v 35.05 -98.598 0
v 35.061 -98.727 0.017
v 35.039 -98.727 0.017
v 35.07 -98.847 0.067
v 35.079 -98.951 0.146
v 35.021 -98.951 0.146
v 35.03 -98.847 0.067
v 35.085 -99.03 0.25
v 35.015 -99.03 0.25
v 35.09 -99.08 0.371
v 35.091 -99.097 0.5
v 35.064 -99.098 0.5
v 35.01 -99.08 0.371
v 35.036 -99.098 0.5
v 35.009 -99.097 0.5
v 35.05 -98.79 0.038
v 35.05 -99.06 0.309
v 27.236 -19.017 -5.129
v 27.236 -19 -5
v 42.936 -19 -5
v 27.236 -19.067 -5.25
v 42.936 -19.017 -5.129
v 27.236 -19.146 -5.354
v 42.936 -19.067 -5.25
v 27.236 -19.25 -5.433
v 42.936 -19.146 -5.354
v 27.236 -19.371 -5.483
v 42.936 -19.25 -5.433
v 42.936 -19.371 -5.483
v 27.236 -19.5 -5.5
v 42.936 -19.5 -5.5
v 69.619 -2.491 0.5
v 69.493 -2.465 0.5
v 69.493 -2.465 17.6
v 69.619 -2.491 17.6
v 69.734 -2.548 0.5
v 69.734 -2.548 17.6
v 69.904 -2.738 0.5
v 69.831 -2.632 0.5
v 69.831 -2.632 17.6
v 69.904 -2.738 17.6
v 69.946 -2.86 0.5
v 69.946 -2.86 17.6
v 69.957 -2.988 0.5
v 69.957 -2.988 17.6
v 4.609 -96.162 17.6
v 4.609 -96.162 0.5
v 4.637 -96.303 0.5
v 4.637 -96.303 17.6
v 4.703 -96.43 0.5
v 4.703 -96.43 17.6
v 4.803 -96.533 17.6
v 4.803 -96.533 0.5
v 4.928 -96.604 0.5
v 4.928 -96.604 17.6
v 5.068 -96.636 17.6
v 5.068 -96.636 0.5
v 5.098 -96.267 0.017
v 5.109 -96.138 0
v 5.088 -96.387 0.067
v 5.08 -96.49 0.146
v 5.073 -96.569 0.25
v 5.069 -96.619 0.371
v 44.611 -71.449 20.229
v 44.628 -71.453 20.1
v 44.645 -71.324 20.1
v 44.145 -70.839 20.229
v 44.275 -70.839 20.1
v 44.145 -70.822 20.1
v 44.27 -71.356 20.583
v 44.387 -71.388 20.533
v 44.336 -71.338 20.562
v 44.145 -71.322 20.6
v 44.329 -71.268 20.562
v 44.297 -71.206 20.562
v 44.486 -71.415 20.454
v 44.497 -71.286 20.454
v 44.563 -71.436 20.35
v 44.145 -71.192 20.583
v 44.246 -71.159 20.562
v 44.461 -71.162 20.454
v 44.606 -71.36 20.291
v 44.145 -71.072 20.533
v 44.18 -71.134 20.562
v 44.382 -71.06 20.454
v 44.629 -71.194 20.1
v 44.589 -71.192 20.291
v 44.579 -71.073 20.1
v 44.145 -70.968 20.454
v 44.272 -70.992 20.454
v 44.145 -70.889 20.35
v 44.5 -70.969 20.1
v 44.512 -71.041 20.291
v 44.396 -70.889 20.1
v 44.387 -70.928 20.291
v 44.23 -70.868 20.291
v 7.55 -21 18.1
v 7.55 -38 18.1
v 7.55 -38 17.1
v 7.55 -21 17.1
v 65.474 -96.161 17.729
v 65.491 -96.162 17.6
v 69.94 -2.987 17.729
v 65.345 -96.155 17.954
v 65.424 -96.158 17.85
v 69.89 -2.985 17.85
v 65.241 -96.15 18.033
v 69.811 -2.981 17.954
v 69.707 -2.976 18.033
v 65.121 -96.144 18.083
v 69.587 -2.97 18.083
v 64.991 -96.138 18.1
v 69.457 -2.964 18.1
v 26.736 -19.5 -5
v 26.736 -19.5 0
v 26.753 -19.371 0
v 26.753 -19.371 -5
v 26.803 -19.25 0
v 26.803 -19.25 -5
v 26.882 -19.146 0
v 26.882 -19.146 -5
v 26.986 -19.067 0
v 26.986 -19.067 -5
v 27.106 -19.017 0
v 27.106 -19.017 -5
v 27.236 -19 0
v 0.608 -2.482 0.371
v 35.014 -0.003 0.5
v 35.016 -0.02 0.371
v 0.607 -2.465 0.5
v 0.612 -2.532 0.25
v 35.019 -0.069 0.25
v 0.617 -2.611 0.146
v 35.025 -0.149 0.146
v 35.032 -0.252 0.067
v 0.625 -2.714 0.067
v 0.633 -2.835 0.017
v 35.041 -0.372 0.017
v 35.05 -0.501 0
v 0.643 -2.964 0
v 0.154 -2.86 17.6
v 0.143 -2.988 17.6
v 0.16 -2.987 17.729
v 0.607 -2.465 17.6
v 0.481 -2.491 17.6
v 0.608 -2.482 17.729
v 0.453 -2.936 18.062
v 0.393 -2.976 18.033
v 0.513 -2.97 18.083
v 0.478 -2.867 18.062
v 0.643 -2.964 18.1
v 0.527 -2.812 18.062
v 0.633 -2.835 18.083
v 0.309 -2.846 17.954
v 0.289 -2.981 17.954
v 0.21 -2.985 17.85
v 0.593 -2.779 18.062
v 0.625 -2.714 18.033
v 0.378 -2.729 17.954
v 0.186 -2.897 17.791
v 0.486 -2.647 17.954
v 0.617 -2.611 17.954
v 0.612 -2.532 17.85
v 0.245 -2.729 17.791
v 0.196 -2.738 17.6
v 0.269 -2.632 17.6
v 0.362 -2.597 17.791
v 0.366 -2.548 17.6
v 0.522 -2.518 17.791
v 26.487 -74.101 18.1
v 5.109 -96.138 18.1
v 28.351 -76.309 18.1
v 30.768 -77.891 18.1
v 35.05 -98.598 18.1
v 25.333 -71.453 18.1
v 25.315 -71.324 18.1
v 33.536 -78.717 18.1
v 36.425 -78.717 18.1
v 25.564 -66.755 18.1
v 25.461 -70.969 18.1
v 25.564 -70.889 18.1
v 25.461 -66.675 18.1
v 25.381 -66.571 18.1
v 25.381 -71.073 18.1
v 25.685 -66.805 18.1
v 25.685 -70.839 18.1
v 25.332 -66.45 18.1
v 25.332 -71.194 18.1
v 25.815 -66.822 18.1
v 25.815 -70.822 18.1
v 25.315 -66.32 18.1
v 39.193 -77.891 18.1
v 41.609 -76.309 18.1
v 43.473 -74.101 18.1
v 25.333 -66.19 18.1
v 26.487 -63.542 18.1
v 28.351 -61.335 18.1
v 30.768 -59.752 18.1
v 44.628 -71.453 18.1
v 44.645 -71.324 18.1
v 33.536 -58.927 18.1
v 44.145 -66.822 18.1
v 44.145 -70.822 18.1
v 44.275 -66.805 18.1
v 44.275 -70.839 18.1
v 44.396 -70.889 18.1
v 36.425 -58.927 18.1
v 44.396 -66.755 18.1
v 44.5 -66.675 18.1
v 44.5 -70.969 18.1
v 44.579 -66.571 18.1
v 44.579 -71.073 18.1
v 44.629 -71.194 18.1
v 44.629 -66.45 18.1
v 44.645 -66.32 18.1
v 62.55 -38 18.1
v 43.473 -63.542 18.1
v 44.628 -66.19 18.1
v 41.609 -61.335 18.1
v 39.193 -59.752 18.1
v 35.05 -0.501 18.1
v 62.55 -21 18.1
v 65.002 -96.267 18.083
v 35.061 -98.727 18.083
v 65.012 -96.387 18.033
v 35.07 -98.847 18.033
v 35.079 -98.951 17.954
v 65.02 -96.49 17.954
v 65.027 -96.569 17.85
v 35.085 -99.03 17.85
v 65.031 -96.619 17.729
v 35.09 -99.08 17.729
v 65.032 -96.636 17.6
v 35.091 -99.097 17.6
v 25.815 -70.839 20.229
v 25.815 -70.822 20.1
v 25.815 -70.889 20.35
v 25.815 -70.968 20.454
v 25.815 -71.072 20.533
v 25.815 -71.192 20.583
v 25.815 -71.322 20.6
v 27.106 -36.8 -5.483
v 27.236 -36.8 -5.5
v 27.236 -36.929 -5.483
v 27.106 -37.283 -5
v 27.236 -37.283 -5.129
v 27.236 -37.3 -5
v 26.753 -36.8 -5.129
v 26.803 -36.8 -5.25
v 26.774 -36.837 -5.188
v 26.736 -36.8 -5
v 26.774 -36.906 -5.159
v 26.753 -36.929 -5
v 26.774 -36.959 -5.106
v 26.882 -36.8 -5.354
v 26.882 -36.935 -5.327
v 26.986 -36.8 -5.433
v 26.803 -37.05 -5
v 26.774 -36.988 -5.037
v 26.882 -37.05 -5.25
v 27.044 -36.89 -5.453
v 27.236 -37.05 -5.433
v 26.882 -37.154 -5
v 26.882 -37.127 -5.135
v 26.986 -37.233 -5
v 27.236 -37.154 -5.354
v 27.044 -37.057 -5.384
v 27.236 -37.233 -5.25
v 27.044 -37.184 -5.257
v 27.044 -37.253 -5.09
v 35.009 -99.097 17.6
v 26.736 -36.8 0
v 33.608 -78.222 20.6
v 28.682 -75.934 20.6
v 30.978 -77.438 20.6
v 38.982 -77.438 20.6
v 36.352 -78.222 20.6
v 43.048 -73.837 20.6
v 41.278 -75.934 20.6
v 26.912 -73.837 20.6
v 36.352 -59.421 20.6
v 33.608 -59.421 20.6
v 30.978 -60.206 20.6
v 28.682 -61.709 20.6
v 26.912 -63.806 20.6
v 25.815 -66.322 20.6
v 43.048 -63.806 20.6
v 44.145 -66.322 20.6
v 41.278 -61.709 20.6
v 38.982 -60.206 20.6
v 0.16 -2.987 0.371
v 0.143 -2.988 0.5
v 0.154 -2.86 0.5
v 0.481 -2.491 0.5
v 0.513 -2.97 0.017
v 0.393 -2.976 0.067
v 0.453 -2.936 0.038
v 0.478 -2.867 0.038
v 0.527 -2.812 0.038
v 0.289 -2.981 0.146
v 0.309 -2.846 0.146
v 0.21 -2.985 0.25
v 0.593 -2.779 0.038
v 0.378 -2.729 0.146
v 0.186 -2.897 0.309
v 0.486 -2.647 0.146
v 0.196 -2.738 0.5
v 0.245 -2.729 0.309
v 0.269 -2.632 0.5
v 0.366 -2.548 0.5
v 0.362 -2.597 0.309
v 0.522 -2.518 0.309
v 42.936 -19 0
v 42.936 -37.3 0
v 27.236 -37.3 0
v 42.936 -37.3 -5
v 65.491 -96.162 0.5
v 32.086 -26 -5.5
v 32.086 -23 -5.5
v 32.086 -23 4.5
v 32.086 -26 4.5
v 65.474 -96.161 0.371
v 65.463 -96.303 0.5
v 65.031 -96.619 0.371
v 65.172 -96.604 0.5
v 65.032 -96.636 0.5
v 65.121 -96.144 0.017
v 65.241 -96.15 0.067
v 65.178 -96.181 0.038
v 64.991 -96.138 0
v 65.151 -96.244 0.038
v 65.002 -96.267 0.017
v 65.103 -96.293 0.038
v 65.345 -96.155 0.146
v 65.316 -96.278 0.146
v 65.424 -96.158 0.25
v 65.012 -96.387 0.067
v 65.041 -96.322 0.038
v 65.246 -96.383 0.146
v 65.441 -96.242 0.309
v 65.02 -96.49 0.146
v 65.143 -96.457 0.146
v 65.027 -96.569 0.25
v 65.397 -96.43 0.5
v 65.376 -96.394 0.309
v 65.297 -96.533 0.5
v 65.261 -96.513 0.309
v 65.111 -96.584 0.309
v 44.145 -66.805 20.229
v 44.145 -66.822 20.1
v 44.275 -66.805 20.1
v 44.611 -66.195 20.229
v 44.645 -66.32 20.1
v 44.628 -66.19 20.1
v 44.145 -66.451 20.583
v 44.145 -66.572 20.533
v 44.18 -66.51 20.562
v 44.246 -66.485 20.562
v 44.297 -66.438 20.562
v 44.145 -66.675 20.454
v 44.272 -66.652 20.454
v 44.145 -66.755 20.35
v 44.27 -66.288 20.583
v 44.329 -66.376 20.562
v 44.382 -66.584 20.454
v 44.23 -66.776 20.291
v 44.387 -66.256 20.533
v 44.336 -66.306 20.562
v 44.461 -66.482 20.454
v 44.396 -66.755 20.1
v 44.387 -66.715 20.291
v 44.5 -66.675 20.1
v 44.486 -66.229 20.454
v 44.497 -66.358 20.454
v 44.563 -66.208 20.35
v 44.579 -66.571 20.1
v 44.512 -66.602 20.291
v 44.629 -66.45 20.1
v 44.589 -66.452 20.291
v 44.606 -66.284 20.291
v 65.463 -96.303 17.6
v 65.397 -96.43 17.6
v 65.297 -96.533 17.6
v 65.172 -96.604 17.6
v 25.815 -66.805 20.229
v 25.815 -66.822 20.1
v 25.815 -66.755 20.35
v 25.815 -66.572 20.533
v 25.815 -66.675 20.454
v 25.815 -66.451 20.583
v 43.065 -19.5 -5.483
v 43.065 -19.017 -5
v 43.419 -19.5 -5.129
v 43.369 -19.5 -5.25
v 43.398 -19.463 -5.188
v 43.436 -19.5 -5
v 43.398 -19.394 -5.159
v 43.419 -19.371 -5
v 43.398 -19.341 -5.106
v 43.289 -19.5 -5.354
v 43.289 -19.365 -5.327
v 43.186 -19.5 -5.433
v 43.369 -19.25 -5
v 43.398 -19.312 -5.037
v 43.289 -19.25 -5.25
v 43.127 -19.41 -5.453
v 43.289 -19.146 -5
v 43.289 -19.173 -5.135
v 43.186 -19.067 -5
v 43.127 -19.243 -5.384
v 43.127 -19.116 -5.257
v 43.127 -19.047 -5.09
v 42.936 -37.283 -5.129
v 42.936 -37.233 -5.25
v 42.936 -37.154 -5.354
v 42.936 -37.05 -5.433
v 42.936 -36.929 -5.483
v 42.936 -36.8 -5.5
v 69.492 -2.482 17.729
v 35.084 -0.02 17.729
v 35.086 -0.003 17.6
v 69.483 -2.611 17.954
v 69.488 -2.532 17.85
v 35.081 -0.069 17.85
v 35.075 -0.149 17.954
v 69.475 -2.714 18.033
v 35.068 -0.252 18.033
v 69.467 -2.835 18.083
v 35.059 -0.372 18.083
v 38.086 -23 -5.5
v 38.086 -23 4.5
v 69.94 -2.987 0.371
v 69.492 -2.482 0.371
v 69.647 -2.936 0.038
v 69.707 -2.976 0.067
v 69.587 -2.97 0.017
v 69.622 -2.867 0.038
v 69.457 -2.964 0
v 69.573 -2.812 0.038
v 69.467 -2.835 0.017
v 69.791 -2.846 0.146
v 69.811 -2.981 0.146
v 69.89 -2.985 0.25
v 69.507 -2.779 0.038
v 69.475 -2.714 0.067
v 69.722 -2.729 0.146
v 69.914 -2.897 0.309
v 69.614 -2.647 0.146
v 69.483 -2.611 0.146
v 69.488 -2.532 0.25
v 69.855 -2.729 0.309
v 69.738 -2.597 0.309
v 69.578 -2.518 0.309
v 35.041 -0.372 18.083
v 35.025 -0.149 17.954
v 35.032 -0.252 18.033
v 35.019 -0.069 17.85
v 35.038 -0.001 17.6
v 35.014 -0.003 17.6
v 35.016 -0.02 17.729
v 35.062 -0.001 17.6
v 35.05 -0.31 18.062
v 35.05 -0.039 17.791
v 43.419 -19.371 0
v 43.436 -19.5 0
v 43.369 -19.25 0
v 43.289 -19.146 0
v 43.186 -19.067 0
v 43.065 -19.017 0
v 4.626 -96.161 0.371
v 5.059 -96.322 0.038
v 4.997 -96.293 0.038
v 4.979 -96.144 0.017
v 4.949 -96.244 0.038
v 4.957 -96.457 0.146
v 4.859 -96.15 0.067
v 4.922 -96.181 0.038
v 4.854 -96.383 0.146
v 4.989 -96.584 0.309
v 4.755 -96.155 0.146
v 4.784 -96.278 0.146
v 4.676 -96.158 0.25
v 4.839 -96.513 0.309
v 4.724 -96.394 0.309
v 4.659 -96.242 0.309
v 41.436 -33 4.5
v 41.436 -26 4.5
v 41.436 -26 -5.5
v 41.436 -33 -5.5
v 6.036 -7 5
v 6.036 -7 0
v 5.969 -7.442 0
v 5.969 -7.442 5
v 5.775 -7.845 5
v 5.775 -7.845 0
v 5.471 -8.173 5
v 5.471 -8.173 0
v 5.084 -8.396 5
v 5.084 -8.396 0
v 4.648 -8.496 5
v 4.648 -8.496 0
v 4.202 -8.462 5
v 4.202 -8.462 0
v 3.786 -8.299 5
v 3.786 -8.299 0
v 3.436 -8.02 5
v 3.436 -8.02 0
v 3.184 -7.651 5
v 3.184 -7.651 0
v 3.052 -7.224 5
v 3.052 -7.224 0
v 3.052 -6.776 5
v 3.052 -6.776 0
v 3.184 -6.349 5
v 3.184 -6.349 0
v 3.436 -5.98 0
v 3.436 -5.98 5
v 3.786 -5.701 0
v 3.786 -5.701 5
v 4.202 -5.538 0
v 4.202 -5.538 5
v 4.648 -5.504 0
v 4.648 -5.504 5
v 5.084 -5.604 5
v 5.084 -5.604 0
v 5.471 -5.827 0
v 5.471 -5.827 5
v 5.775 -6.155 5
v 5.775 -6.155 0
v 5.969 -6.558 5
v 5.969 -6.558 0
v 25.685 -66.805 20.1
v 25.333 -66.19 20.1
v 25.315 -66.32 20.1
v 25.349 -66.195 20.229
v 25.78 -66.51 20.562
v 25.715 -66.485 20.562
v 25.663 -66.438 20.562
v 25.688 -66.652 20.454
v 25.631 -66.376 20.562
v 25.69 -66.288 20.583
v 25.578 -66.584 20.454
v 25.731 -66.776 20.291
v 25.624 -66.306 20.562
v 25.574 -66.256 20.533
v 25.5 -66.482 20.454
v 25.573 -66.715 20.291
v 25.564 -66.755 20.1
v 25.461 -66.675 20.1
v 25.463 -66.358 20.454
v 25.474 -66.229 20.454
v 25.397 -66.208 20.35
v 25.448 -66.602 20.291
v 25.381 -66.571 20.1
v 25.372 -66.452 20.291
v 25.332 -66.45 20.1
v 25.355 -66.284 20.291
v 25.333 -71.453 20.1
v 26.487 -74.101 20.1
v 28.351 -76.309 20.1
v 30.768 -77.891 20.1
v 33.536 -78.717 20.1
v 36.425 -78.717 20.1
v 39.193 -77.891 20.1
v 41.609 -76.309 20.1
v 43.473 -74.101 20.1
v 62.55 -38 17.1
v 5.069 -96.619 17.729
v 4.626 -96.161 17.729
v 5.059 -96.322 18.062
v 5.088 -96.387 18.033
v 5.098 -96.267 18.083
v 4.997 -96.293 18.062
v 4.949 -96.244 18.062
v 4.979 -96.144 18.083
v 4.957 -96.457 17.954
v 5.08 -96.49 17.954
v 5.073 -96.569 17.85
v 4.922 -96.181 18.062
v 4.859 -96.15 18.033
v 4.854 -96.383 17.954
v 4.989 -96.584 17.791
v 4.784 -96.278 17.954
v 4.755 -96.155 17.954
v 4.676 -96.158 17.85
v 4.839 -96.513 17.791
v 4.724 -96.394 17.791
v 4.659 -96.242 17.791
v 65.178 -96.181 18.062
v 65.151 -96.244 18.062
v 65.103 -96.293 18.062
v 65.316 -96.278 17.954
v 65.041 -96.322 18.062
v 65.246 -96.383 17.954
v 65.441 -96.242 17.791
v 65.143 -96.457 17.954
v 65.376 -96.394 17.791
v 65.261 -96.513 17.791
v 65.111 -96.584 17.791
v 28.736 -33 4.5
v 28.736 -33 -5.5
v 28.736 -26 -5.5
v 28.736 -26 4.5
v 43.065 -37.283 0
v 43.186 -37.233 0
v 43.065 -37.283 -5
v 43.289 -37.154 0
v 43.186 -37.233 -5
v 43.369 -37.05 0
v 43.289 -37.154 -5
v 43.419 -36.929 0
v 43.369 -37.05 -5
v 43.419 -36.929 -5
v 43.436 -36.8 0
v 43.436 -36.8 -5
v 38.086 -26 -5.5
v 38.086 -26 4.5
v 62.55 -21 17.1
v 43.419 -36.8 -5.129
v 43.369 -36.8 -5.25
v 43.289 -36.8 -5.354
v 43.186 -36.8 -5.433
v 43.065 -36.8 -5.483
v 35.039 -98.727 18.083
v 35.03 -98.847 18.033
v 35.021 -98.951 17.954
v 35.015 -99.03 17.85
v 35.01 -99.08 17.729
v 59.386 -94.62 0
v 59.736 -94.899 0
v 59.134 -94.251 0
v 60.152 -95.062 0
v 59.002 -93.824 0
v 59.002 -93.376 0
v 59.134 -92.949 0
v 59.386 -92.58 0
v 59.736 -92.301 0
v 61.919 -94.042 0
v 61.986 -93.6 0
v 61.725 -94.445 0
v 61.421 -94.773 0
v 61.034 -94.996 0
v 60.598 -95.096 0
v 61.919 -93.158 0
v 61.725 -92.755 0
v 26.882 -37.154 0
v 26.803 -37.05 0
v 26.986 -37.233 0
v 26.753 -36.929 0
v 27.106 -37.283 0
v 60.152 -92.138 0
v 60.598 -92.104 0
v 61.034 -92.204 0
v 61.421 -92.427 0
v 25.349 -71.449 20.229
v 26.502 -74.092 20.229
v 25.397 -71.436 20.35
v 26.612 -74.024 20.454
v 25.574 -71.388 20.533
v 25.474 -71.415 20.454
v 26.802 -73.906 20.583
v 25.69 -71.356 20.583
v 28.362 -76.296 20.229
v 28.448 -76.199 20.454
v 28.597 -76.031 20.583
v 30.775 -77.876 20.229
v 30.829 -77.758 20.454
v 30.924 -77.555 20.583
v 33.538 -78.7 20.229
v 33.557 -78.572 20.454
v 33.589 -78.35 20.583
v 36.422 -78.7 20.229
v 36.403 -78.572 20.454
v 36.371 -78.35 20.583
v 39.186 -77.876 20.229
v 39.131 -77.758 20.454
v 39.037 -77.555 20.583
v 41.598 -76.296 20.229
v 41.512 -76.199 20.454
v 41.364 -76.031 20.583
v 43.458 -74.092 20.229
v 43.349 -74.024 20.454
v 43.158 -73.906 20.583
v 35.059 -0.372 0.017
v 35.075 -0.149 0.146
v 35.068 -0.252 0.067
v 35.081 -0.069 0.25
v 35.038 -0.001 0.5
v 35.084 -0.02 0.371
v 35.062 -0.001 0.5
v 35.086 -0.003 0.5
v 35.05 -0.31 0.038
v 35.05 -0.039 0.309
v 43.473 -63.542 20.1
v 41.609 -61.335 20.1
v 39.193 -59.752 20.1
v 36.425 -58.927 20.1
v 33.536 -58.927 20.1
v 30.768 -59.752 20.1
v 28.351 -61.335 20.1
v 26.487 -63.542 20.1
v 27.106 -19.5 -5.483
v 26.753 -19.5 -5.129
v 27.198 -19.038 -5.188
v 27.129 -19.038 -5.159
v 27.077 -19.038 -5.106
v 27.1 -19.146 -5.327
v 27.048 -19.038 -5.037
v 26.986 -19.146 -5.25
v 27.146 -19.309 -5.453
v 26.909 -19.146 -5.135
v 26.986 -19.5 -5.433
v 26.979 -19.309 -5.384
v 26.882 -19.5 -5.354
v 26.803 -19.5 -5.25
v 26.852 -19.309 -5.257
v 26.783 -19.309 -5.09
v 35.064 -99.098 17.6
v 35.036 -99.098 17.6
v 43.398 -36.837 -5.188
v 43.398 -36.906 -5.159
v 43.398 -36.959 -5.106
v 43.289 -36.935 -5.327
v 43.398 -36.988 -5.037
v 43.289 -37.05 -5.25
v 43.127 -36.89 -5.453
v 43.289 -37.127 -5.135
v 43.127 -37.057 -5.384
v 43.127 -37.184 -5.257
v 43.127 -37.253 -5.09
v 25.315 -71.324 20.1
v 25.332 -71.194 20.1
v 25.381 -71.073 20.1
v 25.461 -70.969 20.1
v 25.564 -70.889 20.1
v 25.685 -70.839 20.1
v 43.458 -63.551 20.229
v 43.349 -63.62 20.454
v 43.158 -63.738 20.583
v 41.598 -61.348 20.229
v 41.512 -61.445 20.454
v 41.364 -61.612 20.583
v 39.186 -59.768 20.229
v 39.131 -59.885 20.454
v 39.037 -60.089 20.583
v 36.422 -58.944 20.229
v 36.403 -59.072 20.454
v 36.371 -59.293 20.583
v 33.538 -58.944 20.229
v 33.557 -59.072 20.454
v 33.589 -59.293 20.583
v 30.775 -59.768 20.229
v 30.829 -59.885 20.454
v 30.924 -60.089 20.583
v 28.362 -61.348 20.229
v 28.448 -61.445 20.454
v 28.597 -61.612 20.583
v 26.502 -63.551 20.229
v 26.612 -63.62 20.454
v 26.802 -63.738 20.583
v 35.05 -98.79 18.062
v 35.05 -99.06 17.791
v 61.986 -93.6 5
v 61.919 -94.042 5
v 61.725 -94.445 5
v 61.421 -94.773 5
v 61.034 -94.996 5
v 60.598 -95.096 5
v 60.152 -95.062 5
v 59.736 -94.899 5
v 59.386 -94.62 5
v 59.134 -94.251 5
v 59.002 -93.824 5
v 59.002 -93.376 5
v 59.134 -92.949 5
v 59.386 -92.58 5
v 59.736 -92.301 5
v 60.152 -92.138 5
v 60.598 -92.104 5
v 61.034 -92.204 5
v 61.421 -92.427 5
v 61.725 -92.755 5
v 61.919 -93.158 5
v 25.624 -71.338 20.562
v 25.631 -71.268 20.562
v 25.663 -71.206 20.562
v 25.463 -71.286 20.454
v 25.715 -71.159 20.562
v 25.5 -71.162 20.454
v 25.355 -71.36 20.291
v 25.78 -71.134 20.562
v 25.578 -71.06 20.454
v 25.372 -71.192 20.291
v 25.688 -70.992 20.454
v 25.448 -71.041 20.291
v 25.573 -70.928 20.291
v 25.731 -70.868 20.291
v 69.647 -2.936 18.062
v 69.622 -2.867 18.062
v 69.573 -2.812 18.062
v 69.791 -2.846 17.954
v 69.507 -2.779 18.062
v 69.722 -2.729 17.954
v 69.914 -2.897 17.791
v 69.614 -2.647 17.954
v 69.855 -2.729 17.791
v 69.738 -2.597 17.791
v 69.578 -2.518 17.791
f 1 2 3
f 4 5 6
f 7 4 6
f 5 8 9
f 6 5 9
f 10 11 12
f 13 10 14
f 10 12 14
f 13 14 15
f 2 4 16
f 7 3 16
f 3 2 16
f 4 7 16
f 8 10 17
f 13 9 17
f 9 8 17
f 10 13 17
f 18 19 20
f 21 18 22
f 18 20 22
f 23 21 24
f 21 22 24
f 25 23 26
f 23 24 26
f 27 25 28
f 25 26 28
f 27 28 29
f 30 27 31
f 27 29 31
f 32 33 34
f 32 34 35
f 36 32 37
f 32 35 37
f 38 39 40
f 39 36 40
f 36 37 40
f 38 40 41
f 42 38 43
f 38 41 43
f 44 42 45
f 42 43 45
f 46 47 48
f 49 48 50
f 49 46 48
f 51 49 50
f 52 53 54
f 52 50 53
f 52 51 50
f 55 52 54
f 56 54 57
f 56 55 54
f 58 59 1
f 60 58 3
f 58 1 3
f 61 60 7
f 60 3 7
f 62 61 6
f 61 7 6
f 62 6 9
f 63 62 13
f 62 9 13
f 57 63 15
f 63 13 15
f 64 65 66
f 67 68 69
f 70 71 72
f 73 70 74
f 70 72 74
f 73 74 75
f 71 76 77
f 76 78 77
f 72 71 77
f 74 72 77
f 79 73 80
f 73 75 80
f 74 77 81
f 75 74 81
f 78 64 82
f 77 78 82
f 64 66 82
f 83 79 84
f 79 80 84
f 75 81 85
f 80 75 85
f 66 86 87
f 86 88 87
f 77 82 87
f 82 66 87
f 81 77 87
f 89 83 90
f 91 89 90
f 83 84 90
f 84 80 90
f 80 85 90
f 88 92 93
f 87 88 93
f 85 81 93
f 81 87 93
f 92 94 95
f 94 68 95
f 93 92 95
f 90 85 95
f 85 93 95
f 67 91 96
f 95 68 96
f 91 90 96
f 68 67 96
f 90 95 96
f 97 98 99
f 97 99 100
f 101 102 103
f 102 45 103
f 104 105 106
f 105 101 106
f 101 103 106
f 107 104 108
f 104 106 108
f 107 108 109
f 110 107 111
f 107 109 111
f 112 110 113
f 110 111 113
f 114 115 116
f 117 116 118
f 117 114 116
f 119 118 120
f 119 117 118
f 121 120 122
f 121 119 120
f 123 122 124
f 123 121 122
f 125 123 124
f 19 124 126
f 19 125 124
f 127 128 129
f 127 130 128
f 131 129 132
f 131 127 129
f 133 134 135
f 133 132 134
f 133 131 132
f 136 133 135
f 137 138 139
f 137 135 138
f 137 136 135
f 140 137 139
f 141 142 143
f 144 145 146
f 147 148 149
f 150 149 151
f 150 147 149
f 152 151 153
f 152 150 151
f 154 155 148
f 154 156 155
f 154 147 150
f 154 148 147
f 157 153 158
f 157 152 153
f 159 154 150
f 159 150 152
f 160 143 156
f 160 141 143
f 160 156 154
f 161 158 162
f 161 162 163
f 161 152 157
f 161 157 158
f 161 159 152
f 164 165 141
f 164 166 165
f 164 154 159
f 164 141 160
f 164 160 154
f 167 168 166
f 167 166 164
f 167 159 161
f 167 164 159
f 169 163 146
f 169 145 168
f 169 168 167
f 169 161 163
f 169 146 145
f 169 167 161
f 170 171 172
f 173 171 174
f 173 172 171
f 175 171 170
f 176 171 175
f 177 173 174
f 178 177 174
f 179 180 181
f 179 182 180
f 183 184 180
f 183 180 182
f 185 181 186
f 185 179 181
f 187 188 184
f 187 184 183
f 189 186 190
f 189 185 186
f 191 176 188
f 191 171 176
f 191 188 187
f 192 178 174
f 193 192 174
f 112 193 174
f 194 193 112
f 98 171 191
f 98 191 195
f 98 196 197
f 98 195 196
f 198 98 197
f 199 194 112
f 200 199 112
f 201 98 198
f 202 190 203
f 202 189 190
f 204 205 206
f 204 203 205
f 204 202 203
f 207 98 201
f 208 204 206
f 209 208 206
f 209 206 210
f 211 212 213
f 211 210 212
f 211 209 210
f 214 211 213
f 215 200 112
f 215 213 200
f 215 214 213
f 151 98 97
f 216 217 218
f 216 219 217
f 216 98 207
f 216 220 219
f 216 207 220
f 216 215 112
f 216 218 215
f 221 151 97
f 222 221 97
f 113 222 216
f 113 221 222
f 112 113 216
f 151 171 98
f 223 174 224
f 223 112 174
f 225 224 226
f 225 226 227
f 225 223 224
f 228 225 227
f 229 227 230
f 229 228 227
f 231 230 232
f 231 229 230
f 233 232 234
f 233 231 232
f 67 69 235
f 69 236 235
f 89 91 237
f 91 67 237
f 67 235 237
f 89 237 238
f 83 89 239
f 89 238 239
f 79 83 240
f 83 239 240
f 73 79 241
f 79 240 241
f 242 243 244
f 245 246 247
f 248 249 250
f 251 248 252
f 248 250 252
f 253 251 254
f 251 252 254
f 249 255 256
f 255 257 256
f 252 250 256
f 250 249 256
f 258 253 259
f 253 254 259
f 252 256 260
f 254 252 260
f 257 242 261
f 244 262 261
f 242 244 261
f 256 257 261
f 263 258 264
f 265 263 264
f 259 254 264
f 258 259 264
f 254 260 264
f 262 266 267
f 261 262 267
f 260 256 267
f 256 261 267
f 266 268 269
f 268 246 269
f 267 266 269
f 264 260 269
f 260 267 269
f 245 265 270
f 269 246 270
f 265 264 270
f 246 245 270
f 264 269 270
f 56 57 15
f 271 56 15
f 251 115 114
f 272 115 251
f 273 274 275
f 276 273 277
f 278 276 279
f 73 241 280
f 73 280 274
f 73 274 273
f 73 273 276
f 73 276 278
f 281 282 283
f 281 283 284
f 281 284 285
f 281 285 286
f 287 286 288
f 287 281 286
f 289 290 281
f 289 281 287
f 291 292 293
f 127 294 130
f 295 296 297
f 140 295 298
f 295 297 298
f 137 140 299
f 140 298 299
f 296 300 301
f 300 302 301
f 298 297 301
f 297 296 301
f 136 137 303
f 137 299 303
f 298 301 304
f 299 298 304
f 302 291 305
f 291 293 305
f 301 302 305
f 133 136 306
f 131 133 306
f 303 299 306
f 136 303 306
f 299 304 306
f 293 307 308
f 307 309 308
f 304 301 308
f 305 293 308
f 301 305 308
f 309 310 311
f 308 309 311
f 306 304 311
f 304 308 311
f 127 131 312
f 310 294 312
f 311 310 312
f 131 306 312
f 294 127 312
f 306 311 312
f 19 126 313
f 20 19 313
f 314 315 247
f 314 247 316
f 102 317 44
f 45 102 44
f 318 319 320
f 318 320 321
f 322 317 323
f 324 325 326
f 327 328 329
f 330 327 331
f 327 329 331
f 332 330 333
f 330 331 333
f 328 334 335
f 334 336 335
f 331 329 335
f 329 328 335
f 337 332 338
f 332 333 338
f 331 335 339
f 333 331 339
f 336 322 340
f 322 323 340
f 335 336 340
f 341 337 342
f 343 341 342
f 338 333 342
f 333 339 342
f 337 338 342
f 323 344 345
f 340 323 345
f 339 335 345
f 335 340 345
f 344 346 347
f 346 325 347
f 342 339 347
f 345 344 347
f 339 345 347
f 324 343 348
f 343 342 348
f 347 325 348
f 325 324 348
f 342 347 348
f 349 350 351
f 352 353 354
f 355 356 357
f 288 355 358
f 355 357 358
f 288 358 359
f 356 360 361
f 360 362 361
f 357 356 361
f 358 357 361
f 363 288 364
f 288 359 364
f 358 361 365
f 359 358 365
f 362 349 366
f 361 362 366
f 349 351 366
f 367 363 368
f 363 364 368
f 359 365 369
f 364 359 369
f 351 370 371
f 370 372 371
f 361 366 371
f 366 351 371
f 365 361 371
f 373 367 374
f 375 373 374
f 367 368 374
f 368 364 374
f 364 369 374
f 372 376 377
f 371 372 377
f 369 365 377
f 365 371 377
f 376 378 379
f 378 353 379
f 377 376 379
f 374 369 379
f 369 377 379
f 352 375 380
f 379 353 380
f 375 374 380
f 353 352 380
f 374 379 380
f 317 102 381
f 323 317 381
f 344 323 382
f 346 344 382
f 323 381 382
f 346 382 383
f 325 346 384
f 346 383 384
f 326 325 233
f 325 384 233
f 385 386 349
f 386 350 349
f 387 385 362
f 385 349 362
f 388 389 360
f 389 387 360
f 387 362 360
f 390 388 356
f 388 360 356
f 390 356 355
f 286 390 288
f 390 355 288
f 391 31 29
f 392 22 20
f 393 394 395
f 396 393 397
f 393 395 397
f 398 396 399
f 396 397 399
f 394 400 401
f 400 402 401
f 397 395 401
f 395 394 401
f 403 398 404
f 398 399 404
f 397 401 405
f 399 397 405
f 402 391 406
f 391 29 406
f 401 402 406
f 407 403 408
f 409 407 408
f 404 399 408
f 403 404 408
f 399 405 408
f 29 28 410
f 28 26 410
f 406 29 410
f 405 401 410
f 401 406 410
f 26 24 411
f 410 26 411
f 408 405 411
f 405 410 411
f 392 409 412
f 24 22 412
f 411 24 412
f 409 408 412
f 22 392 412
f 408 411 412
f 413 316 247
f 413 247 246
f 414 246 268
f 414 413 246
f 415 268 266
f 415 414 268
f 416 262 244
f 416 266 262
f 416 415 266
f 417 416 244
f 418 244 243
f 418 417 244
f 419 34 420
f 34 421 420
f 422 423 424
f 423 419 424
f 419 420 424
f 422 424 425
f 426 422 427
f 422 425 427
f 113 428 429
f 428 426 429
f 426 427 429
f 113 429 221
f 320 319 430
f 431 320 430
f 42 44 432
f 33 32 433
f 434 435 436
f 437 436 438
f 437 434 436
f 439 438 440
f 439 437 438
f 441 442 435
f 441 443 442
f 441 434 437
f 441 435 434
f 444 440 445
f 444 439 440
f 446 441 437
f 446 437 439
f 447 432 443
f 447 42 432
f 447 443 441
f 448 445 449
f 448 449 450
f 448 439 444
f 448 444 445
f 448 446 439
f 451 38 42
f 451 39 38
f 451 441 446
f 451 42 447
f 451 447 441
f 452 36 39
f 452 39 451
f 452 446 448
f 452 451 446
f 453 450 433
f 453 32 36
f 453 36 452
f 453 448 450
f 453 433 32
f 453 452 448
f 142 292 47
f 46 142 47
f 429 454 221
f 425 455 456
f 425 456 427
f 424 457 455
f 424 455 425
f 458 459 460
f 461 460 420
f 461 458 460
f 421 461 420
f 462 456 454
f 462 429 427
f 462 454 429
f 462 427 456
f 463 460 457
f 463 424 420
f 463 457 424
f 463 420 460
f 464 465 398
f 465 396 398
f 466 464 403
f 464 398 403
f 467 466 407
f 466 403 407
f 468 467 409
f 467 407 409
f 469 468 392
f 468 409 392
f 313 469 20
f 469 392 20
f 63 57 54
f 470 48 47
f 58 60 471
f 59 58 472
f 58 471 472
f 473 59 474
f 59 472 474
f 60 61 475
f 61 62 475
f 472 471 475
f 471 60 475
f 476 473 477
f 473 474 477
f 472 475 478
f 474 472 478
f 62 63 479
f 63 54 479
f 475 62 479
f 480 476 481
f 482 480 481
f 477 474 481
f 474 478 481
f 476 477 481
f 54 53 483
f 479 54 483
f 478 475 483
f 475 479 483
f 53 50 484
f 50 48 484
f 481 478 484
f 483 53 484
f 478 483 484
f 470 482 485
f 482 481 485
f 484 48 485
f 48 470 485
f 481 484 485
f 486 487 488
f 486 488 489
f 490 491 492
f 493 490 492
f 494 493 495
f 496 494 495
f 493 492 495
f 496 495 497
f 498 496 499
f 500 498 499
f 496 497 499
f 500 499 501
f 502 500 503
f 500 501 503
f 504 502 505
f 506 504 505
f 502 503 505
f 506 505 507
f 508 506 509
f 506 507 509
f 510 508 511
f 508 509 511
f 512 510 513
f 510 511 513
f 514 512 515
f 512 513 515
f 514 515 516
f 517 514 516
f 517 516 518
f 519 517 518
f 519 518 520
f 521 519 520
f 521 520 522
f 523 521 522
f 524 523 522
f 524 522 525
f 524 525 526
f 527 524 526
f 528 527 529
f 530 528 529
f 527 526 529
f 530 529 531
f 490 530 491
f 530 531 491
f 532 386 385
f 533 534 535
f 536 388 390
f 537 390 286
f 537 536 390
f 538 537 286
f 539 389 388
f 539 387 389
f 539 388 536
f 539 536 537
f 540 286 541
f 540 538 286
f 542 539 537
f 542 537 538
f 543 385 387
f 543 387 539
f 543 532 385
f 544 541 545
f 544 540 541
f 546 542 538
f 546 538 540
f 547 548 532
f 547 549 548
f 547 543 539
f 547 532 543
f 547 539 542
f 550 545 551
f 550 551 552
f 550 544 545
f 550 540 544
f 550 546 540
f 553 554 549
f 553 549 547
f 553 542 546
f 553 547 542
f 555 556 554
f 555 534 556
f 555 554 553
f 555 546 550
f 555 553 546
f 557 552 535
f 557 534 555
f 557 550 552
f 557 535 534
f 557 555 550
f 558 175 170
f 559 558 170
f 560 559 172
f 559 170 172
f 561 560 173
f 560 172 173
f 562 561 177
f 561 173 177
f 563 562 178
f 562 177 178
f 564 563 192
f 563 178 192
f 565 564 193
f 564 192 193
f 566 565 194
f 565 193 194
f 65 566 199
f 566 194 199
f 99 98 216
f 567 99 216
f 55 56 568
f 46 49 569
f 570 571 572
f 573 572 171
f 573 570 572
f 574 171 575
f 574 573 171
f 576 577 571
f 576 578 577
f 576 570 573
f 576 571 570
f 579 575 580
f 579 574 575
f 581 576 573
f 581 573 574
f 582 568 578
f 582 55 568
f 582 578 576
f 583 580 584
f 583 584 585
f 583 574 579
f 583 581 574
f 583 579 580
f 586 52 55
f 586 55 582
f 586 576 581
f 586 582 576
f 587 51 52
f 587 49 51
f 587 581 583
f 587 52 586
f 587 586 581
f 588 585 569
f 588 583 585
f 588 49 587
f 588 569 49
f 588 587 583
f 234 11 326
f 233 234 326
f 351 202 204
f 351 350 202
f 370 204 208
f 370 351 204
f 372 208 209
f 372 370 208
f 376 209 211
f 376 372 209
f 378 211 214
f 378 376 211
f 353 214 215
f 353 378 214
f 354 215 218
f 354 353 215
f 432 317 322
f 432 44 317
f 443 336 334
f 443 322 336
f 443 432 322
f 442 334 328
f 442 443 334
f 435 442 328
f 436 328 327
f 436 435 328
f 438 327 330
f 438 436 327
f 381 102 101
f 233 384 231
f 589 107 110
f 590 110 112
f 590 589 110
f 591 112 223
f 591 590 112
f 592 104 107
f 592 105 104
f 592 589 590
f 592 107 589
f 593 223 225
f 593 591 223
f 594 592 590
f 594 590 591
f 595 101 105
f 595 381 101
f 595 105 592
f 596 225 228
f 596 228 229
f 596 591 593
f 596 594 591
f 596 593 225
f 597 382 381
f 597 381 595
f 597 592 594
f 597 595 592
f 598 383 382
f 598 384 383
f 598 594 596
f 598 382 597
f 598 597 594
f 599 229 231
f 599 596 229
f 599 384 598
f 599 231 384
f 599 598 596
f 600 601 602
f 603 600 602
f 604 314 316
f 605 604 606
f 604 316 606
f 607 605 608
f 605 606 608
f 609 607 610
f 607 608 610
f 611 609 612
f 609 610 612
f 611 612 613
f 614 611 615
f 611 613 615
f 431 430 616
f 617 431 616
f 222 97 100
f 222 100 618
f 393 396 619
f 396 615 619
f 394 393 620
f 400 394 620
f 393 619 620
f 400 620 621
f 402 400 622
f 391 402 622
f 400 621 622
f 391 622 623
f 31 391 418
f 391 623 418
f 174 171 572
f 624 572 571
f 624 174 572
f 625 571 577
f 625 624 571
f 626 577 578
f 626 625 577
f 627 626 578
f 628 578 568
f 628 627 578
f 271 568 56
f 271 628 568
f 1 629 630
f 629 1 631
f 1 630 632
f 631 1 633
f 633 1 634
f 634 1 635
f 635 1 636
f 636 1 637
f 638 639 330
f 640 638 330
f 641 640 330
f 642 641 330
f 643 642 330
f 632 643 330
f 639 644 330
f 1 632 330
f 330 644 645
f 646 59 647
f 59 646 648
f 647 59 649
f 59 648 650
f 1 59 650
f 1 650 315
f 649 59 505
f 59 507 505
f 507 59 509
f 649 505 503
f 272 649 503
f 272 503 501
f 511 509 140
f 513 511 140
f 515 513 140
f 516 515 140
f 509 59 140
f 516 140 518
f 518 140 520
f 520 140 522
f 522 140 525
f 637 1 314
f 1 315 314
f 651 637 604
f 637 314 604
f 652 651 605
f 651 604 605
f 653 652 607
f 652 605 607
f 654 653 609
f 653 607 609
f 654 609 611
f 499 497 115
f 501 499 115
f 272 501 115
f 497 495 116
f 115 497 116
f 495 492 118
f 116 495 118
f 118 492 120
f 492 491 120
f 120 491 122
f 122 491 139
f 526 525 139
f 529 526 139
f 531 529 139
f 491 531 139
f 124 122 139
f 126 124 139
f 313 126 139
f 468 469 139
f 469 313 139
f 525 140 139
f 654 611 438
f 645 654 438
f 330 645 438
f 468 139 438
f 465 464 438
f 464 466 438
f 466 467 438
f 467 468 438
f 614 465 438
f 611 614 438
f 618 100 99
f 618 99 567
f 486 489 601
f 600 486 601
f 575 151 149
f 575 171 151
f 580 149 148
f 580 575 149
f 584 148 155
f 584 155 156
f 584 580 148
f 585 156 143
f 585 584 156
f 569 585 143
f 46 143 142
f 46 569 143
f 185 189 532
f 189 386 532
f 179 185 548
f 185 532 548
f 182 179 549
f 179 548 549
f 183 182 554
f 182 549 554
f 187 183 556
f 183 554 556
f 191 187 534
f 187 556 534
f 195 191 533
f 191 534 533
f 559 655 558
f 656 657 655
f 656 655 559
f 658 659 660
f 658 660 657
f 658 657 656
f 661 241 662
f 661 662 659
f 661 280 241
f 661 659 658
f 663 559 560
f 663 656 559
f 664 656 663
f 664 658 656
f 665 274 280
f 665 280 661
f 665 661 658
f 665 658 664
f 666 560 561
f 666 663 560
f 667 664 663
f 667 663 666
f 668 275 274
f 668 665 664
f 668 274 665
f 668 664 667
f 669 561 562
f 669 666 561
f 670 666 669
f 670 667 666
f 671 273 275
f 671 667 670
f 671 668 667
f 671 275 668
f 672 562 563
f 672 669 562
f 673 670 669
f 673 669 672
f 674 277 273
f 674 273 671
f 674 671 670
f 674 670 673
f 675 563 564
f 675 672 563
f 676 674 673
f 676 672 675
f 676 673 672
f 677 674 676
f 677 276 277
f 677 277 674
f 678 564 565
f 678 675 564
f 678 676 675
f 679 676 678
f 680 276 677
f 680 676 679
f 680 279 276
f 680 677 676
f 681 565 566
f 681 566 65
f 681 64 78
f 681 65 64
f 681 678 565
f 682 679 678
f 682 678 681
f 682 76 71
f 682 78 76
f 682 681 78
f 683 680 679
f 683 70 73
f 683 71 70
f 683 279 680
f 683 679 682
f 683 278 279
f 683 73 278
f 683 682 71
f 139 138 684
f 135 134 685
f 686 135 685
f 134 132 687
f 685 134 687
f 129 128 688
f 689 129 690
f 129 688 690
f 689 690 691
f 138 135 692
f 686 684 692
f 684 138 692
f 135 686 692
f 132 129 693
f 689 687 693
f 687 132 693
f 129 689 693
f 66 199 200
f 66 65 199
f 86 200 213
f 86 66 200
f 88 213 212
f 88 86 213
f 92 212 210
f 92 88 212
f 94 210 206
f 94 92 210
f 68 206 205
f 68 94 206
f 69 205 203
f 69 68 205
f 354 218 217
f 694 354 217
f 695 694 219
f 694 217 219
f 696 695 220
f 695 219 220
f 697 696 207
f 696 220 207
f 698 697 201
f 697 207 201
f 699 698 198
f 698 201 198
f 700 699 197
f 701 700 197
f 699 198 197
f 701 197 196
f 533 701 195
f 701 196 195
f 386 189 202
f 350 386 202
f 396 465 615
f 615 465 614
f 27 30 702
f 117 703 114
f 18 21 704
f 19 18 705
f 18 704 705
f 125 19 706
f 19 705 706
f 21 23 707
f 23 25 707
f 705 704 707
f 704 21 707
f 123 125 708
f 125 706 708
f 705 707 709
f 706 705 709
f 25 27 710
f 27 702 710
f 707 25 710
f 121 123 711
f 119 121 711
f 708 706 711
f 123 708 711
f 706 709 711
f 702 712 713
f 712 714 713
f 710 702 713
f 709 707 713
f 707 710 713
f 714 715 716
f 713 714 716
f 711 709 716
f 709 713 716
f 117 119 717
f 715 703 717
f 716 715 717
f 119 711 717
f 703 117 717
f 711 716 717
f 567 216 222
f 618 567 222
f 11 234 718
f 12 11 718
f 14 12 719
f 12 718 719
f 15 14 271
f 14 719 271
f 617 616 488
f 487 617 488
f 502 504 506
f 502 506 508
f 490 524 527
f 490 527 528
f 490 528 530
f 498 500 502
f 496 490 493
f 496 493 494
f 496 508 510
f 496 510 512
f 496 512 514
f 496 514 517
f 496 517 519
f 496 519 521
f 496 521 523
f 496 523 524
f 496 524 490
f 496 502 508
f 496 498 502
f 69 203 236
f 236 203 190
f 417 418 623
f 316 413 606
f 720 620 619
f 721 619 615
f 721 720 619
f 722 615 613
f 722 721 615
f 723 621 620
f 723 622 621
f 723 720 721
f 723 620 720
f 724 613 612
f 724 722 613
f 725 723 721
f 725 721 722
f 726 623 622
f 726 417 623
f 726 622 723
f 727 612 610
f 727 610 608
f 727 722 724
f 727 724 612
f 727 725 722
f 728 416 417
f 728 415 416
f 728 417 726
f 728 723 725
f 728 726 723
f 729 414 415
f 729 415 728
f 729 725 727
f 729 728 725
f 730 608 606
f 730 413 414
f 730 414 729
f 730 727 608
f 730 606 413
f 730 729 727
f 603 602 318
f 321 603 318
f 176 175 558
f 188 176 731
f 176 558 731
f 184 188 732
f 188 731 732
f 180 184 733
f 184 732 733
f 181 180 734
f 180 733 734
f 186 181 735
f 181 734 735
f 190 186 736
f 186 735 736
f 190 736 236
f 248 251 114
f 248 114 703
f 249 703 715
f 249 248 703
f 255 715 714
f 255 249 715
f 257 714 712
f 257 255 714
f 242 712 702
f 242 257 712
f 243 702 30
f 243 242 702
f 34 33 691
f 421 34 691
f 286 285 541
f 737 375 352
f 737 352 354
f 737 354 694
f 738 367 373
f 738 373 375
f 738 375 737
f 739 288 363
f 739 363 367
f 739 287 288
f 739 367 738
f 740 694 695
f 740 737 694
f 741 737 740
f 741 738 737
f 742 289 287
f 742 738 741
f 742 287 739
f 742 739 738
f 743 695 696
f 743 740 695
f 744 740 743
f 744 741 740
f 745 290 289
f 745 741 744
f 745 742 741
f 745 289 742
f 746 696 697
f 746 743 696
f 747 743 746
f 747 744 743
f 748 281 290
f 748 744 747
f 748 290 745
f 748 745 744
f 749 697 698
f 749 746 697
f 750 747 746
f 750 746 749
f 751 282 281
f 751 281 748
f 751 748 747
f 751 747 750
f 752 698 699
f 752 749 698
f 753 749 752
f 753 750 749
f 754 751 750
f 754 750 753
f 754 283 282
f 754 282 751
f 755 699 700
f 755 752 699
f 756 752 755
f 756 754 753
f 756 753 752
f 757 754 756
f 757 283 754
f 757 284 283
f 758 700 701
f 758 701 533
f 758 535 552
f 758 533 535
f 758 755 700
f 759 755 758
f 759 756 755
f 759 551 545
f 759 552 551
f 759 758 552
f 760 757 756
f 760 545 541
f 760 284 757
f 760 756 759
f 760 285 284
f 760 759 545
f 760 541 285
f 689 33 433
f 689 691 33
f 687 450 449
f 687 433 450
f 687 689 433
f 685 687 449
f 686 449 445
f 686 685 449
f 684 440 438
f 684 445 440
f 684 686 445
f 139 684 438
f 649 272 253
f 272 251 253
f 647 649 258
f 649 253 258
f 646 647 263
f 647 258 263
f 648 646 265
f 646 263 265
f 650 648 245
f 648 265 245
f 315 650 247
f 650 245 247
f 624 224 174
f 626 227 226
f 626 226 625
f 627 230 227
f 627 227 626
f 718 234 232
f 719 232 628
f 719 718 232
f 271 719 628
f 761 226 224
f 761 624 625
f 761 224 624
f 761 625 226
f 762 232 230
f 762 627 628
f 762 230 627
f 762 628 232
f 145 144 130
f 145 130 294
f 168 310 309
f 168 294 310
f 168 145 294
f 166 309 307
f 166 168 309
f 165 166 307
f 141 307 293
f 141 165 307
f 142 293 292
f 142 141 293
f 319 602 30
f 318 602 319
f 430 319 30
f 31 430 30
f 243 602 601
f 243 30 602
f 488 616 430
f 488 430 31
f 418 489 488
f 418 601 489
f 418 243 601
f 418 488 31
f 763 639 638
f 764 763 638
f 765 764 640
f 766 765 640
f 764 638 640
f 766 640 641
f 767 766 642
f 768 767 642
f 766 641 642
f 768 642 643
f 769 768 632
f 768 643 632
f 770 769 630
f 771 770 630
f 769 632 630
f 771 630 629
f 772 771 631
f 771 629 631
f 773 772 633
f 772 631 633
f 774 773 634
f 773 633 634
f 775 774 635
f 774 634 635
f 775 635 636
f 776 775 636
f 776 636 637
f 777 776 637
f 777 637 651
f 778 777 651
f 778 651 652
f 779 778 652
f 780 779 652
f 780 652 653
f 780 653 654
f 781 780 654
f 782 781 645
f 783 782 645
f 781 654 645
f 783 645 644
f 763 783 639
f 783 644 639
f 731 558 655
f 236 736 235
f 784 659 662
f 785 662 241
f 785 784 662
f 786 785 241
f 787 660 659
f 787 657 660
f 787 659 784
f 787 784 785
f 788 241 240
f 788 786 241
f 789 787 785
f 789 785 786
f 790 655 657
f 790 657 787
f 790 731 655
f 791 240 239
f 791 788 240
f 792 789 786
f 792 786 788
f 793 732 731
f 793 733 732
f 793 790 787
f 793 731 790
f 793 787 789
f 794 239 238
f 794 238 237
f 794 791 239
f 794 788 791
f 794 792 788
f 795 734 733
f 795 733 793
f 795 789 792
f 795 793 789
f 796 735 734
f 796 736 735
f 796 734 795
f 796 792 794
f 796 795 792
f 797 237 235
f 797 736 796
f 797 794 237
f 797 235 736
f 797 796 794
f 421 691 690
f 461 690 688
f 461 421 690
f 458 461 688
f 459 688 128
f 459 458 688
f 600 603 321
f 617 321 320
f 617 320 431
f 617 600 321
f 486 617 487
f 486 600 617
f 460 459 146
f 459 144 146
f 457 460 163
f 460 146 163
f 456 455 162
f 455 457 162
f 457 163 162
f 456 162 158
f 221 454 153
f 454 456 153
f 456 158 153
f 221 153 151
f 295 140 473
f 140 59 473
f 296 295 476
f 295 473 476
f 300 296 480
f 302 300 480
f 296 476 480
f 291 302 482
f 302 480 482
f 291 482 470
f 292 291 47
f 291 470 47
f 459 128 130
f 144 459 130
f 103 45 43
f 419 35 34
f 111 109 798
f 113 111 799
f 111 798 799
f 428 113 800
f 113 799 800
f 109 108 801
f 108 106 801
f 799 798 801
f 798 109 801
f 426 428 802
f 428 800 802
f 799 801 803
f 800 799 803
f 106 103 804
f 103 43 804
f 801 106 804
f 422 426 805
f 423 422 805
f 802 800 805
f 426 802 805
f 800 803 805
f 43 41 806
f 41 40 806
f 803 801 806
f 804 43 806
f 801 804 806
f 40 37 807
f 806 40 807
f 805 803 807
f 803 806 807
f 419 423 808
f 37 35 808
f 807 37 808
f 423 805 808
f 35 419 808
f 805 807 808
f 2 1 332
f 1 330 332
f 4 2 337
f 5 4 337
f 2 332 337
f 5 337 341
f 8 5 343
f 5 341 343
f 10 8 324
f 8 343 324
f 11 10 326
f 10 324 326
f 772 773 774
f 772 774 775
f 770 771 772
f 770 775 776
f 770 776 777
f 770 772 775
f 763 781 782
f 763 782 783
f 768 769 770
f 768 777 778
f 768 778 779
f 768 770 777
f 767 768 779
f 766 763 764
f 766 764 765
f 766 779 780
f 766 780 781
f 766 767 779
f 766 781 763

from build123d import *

# Parameters (mm, degrees)
F1_DEPTH  = 18.1
F3_DEPTH  = 2.5
F4_W      = 55
F4_H      = 17
F5_DEPTH  = 1
F6_R      = 0.5
F7_W      = 16.7
F7_H      = 18.3
F8_DEPTH  = 5.5
F9_R      = 0.5
F10_W     = 6
F10_H     = 3
F11_DEPTH = 10
F12_R     = 1.5
F13_DEPTH = 5


with BuildPart() as f1:
    # F0 (on Top) → F1 (new body)
    with BuildSketch(Plane.XY):
        Polygon((69.9801715439, -2.5), (35.05, 0), (0.1198284561, -2.5), (4.6301715439, -96.6), (35.05, -99.1), (65.4698284561, -96.6), align=None)
    extrude(amount=F1_DEPTH)

    # F2 (on face) → F3 (join)
    with BuildSketch(Plane.XY.offset(18.1)):
        with BuildLine():
            Line((25.1822125728, -66.8218548894), (44.778130515, -66.8218548894))
            ThreePointArc((44.778130515, -66.8218548894), (34.9801715439, -58.8218548894), (25.1822125728, -66.8218548894))
        make_face()
        with BuildLine():
            ThreePointArc((25.1822125728, -70.8218548894), (34.9801715439, -78.8218548894), (44.778130515, -70.8218548894))
            Line((44.778130515, -70.8218548894), (25.1822125728, -70.8218548894))
        make_face()
    extrude(amount=F3_DEPTH)

    # F4 (on face) → F5 (cut)
    with BuildSketch(Plane.XY.offset(18.1)):
        with Locations((35.05, -29.5)):
            Rectangle(F4_W, F4_H)
    extrude(amount=-F5_DEPTH, mode=Mode.SUBTRACT)

    # F6
    f6_edges = [f1.edges().sort_by_distance(p)[0] for p in [
        (34.980172, -66.821855, 20.6),
        (34.980172, -58.821855, 20.6),
        (34.980172, -78.821855, 20.6),
        (34.980172, -70.821855, 20.6),
        (25.182213, -70.821855, 19.35),
        (44.778131, -66.821855, 19.35),
        (25.182213, -66.821855, 19.35),
        (44.778131, -70.821855, 19.35),
        (65.469828, -96.6, 9.05),
        (69.980172, -2.5, 9.05),
        (67.725, -49.55, 0),
        (67.725, -49.55, 18.1),
        (35.05, -99.1, 9.05),
        (50.259914, -97.85, 0),
        (50.259914, -97.85, 18.1),
        (4.630172, -96.6, 9.05),
        (19.840086, -97.85, 0),
        (19.840086, -97.85, 18.1),
        (0.119828, -2.5, 9.05),
        (2.375, -49.55, 0),
        (2.375, -49.55, 18.1),
        (35.05, 0, 9.05),
        (17.584914, -1.25, 0),
        (17.584914, -1.25, 18.1),
        (52.515086, -1.25, 0),
        (52.515086, -1.25, 18.1),
    ]]
    fillet(f6_edges, radius=F6_R)

    # F7 (on face) → F8 (join)
    with BuildSketch(Plane(origin=(0, 0, 0), x_dir=(1, 0, 0), z_dir=(0, 0, -1))):
        with Locations((35.0856943769, 28.15)):
            Rectangle(F7_W, F7_H)
    extrude(amount=F8_DEPTH)

    # F9
    f9_edges = [f1.edges().sort_by_distance(p)[0] for p in [
        (35.085694, -37.3, -5.5),
        (26.735694, -28.15, -5.5),
        (35.085694, -19, -5.5),
        (43.435694, -28.15, -5.5),
        (43.435694, -19, -2.75),
        (26.735694, -19, -2.75),
        (26.735694, -37.3, -2.75),
        (43.435694, -37.3, -2.75),
    ]]
    fillet(f9_edges, radius=F9_R)

    # F10 (on face) → F11 (cut)
    with BuildSketch(Plane(origin=(0, 0, -5.5), x_dir=(1, 0, 0), z_dir=(0, 0, -1))):
        Polygon((38.0856943769, 26), (41.4356943769, 26), (41.4356943769, 33), (28.7356943769, 33), (28.7356943769, 26), (32.0856943769, 26), align=None)
        with Locations((35.0856943769, 24.5)):
            Rectangle(F10_W, F10_H)
    extrude(amount=-F11_DEPTH, mode=Mode.SUBTRACT)

    # F12 (on face) → F13 (cut)
    with BuildSketch(Plane(origin=(0, 0, 0), x_dir=(1, 0, 0), z_dir=(0, 0, -1))):
        with Locations((4.5356943769, 7)):
            Circle(F12_R)
        with Locations((60.4856943769, 93.6)):
            Circle(F12_R)
    extrude(amount=-F13_DEPTH, mode=Mode.SUBTRACT)


solid = f1.part
